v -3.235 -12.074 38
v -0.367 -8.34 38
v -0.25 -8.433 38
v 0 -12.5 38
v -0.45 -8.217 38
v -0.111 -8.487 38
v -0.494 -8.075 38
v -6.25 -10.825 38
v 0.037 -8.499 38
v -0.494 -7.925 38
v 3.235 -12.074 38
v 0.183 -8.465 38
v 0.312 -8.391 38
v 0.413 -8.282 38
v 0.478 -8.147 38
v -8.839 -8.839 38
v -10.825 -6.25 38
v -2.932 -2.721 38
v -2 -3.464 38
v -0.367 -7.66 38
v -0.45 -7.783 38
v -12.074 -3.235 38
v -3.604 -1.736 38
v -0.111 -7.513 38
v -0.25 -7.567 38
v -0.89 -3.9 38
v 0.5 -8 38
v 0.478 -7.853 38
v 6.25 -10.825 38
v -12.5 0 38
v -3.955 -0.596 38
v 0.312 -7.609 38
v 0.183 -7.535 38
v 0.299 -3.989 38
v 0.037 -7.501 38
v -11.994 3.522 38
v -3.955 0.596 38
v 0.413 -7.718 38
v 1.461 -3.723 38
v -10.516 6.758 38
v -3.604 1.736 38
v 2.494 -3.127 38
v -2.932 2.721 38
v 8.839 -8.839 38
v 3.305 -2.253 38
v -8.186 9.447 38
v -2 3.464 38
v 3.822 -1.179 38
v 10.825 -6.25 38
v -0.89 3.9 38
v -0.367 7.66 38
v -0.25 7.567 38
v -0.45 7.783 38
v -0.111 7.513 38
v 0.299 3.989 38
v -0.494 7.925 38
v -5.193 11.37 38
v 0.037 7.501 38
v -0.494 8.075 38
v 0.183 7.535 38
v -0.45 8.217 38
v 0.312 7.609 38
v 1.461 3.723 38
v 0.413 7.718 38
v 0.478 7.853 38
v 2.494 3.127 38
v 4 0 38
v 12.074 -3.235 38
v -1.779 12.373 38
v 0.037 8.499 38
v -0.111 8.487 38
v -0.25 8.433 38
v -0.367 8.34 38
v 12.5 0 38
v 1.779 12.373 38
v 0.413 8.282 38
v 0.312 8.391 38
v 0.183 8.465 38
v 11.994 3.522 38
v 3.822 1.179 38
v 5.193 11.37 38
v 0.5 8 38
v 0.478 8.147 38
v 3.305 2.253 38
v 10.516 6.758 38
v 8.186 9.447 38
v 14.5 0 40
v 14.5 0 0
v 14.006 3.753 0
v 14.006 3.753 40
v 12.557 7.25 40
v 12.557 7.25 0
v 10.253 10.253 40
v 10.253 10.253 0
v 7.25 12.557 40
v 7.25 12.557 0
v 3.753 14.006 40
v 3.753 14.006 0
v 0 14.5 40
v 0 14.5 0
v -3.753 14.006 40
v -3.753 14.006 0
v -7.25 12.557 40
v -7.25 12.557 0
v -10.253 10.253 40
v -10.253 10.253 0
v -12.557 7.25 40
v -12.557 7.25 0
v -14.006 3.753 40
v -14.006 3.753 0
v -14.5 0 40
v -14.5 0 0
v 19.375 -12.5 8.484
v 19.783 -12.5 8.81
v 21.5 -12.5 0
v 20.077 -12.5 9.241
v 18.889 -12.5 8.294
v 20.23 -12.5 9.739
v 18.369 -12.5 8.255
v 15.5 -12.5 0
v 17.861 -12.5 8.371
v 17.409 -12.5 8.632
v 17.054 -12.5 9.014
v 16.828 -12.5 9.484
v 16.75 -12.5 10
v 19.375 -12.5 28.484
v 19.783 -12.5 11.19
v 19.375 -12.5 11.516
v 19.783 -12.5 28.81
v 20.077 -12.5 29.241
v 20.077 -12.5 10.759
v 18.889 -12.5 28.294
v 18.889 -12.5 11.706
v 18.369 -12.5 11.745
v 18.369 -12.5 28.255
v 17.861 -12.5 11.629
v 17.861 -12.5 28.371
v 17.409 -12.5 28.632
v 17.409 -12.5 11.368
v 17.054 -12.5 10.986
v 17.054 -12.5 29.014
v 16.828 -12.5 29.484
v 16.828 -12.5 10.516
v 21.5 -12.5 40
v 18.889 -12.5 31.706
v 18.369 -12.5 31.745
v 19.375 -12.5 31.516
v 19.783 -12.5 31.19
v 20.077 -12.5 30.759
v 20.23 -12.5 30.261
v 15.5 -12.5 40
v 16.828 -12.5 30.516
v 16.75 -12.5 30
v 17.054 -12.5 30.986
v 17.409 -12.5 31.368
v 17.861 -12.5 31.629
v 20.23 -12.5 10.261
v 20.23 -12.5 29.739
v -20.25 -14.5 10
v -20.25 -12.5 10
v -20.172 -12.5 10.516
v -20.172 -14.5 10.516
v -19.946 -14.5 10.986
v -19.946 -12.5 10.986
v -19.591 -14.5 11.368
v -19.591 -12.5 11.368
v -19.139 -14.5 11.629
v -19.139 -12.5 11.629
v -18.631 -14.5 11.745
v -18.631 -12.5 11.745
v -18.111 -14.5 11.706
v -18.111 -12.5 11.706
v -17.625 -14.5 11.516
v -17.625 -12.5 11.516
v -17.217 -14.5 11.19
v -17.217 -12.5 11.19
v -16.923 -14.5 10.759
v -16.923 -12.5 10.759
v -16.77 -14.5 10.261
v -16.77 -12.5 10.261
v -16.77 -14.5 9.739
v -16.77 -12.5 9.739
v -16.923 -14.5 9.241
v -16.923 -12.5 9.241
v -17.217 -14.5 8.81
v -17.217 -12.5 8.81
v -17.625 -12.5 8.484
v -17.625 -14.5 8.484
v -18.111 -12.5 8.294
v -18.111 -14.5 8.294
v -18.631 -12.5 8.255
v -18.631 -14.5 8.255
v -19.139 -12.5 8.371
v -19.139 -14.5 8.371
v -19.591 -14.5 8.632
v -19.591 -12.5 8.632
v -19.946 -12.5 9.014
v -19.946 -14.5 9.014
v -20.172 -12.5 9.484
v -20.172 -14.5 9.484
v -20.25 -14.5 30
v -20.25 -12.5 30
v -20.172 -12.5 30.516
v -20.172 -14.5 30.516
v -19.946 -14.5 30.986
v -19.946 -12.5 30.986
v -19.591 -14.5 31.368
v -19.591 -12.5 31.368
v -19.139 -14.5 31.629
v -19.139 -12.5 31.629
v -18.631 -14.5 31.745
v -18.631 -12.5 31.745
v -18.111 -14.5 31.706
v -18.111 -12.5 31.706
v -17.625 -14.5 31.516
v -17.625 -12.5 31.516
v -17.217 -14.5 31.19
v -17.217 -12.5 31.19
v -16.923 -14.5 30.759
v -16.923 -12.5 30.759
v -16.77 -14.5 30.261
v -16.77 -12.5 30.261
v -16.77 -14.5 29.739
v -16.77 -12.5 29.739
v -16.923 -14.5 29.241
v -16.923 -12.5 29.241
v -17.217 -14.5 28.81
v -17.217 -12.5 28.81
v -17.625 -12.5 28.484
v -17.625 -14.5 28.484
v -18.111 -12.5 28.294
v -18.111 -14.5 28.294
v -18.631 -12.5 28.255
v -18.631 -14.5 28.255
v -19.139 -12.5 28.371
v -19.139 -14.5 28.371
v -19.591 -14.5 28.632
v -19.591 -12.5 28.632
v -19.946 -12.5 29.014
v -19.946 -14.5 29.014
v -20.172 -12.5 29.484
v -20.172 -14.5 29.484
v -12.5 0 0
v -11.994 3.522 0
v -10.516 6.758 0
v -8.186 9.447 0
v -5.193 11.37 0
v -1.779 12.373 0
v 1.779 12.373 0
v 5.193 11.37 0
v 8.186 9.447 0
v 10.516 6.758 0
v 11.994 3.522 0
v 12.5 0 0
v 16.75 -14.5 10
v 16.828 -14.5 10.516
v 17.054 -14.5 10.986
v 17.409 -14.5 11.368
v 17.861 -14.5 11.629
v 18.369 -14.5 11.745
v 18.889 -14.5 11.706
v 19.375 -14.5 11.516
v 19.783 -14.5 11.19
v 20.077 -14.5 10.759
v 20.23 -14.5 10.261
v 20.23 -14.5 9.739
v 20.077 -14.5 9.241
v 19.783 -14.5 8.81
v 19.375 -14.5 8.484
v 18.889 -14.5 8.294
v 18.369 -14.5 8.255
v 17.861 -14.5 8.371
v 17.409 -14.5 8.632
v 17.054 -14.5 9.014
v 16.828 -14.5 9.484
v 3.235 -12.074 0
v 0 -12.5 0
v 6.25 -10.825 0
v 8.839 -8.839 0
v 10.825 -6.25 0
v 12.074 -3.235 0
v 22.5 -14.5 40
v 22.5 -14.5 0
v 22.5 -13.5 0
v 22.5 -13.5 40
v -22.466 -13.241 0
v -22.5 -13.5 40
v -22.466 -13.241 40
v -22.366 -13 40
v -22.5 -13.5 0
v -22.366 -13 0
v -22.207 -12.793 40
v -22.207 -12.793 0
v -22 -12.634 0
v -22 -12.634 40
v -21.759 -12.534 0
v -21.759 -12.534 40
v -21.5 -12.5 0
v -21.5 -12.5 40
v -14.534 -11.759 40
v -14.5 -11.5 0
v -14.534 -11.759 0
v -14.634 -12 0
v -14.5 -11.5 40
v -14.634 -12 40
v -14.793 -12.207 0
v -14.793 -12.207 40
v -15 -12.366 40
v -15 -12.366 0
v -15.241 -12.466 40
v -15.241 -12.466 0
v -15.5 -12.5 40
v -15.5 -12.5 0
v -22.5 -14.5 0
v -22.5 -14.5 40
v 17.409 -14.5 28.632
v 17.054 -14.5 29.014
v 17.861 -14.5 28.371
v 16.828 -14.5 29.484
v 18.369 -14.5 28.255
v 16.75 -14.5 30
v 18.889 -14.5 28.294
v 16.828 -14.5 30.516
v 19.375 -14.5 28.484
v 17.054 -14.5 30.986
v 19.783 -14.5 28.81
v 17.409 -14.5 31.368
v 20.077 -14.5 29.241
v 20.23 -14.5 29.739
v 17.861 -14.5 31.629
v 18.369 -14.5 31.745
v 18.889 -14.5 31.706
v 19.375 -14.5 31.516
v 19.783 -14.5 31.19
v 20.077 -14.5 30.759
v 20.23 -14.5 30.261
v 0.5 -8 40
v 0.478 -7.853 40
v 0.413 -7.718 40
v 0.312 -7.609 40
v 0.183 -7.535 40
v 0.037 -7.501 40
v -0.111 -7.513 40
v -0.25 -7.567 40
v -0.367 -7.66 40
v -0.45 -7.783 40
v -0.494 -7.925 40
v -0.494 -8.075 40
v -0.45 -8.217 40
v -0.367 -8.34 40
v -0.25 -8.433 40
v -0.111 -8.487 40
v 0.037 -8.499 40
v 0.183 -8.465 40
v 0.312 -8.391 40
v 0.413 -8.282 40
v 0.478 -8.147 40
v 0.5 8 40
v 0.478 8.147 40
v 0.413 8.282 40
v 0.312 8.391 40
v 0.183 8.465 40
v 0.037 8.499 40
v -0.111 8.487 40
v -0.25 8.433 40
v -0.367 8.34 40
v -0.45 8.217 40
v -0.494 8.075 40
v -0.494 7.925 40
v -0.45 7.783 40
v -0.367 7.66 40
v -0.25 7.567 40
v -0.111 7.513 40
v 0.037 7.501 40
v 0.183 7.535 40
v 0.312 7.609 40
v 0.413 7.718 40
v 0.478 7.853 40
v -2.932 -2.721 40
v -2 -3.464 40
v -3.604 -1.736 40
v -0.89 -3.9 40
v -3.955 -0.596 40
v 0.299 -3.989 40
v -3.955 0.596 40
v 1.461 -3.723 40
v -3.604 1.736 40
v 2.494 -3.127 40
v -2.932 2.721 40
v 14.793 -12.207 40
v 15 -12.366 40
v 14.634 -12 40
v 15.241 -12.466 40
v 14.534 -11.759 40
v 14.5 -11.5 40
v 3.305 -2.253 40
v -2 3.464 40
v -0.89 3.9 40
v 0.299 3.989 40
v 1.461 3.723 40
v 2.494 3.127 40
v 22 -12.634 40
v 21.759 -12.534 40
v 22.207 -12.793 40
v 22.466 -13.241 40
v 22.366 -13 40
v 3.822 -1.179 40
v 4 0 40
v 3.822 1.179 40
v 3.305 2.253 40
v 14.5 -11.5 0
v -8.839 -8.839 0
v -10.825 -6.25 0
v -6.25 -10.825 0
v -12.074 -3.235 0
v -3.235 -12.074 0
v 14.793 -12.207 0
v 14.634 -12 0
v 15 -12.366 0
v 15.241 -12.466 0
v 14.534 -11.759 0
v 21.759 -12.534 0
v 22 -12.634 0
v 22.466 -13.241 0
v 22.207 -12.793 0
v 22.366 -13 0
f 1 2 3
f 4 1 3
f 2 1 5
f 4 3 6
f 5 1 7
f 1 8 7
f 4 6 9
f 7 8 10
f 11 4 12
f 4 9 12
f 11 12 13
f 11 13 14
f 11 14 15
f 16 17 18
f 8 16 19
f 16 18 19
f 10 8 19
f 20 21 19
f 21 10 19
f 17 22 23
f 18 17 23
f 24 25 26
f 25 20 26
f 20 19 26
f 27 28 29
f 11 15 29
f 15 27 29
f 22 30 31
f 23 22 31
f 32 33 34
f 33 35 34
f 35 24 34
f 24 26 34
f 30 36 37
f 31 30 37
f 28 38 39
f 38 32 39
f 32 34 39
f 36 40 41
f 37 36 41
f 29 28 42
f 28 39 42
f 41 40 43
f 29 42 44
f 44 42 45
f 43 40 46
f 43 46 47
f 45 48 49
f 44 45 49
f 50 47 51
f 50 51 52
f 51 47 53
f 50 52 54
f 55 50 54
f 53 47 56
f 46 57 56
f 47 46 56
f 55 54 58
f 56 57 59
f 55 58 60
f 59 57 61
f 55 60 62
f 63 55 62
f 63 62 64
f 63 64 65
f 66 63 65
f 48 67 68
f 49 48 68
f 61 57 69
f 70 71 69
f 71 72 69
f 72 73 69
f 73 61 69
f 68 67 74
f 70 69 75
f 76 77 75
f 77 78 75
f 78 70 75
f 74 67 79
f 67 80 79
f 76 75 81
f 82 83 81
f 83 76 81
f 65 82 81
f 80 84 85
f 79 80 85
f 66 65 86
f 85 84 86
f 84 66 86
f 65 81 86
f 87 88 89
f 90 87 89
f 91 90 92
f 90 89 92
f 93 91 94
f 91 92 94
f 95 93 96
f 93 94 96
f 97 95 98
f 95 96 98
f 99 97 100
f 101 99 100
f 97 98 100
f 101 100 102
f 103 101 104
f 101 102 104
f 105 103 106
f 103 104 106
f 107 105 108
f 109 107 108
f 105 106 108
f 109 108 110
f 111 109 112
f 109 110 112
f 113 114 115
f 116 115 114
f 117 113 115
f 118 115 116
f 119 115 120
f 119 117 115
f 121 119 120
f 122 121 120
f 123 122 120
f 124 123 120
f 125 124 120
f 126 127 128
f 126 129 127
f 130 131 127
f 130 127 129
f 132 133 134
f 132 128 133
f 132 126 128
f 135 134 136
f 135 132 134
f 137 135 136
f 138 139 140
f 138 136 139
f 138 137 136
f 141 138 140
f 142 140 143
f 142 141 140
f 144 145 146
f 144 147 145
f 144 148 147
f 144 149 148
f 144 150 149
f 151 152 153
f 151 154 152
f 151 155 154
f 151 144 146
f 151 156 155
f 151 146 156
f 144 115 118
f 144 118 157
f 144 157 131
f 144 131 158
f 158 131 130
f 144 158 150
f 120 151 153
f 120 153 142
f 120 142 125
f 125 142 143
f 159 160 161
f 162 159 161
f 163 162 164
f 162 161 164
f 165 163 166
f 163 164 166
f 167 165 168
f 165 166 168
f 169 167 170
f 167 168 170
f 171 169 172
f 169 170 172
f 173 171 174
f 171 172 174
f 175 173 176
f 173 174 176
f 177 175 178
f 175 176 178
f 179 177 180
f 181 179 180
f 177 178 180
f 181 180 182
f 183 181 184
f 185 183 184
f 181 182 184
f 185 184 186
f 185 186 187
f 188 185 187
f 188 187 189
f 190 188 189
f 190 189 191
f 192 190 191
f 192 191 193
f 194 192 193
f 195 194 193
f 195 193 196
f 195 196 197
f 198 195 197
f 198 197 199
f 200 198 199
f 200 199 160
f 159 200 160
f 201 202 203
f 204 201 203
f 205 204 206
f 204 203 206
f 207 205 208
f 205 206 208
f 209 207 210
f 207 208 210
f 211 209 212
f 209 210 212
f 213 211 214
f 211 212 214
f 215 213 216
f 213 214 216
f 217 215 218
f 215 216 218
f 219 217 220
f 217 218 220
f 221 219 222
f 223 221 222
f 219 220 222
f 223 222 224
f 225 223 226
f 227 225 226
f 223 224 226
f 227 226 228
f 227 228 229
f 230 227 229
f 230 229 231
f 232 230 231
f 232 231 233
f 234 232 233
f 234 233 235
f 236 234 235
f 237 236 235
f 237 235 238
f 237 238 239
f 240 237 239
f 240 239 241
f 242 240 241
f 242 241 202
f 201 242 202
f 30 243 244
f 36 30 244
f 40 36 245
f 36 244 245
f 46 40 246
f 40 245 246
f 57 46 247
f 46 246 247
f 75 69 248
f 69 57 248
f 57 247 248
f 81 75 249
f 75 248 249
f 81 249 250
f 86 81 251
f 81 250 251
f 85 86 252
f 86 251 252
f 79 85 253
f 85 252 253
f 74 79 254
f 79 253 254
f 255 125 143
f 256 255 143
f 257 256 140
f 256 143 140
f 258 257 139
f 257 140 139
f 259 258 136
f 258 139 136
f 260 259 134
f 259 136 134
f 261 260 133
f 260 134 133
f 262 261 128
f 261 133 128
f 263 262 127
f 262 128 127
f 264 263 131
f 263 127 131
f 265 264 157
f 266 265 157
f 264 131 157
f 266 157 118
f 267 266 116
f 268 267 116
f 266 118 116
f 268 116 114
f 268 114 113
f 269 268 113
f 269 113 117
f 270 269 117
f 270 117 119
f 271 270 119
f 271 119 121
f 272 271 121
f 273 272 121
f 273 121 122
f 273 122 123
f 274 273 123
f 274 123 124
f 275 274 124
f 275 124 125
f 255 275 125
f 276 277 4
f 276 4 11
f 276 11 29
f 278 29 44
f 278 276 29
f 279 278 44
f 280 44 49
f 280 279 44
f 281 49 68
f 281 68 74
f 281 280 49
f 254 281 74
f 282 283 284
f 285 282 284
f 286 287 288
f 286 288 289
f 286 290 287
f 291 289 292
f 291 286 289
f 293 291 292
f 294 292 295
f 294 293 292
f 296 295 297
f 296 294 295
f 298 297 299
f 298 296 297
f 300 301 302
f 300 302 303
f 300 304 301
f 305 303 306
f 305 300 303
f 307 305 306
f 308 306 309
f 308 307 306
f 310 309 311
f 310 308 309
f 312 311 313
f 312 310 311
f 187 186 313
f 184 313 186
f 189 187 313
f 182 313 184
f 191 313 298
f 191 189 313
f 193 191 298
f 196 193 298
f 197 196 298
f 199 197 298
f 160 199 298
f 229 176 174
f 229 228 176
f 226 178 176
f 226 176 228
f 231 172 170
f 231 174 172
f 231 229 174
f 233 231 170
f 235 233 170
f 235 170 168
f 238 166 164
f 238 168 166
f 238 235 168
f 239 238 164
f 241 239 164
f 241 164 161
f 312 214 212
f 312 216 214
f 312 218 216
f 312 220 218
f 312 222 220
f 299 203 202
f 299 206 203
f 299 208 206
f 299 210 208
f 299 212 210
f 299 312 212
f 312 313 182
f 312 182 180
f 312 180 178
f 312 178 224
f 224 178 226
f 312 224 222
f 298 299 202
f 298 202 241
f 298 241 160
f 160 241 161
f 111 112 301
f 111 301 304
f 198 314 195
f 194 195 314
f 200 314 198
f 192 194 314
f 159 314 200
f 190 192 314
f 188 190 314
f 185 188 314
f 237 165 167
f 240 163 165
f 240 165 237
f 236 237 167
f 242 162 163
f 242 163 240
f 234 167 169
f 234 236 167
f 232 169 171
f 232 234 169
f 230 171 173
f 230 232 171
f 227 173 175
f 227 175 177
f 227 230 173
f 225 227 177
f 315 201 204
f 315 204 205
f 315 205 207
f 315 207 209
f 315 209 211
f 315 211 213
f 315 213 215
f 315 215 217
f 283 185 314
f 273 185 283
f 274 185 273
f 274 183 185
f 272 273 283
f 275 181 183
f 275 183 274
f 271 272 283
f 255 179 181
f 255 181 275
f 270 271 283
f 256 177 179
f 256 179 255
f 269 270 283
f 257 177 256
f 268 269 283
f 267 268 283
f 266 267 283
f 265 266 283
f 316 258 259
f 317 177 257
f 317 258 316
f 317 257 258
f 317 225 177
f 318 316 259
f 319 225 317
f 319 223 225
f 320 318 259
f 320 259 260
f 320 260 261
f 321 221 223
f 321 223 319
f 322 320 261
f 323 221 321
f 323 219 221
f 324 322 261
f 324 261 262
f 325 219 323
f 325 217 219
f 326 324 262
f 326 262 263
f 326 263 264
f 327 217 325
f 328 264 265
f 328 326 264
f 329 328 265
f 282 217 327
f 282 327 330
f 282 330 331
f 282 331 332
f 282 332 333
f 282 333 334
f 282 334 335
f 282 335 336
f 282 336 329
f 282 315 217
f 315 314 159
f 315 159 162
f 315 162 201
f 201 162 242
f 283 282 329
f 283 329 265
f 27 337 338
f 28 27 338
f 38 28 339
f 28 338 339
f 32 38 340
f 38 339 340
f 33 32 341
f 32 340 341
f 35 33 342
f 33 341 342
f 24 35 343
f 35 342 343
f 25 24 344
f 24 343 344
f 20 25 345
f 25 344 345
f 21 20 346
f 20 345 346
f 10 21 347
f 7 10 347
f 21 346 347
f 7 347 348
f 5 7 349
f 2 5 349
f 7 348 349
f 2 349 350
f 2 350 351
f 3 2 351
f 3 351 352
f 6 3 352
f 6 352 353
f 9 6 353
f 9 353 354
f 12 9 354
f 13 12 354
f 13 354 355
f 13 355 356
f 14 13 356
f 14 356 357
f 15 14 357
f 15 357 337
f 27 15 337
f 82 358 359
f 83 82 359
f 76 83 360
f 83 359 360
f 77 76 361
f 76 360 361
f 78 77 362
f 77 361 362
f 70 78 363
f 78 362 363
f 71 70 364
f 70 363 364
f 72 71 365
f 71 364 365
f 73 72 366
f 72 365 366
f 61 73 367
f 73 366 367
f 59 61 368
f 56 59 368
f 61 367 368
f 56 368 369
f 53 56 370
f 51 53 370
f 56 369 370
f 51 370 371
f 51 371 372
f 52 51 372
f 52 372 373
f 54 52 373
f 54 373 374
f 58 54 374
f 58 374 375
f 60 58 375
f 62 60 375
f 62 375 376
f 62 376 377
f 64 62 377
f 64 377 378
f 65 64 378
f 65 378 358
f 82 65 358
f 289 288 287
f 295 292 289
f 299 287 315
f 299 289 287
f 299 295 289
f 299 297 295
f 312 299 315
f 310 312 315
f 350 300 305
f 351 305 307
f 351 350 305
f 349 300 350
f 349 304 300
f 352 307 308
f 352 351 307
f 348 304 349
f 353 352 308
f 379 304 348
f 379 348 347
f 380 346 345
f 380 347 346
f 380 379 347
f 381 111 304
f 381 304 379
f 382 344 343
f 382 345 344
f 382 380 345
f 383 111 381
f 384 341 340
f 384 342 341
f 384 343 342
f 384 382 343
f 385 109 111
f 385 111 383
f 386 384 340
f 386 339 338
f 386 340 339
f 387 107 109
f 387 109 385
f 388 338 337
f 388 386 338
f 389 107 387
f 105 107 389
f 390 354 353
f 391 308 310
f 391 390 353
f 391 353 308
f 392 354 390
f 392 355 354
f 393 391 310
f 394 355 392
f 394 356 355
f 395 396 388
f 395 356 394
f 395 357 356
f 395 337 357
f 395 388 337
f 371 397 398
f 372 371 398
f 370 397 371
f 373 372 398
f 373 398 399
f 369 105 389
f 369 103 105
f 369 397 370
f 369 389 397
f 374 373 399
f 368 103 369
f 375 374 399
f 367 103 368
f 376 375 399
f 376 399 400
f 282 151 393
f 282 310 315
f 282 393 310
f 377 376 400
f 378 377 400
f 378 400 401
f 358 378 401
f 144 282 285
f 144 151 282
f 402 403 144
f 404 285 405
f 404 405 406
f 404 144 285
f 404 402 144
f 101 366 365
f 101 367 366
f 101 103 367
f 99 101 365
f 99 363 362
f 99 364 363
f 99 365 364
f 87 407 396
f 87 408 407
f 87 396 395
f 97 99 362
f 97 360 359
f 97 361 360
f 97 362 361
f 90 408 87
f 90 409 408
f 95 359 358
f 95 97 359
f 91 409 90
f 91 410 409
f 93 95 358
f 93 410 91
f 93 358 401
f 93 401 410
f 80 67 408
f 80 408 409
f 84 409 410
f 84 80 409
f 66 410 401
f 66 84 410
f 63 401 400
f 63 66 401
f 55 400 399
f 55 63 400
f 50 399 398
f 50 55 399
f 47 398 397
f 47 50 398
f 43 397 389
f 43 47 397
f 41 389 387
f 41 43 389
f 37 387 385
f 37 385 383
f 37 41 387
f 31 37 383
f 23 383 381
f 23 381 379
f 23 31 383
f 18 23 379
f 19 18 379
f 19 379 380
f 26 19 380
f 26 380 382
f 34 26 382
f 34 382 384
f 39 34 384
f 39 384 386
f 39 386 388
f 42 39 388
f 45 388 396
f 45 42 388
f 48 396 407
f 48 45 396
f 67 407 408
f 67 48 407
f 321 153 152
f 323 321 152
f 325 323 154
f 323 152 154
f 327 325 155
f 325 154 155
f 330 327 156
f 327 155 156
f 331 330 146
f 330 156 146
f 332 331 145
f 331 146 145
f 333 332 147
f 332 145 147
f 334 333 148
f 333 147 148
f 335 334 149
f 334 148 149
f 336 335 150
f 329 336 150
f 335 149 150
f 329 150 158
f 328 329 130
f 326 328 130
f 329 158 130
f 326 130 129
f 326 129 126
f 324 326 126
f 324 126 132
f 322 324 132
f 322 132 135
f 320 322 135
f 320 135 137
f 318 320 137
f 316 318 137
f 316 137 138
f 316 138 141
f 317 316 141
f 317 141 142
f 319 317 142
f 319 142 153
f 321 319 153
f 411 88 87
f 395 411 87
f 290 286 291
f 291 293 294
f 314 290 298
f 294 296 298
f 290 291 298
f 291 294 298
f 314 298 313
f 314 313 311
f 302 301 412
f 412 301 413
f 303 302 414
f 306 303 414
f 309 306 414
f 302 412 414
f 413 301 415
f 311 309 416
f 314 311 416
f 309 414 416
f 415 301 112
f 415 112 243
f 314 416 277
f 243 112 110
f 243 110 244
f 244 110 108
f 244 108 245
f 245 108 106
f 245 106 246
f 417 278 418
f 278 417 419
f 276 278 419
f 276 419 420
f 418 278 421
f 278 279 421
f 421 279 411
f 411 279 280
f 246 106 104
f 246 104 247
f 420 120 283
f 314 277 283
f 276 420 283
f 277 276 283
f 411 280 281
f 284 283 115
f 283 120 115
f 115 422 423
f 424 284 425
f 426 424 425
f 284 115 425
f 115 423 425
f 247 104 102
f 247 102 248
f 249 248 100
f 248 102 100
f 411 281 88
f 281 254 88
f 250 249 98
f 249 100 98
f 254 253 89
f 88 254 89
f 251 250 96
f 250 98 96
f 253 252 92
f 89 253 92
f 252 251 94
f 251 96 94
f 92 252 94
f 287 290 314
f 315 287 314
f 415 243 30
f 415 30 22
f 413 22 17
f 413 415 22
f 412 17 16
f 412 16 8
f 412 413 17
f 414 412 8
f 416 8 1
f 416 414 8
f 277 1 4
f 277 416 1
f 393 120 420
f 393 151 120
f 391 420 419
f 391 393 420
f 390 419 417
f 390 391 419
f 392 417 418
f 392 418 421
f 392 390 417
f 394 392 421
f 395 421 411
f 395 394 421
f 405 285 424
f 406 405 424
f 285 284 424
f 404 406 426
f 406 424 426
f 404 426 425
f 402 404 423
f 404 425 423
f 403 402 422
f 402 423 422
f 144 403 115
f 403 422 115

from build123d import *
from build123d.topology import SkipClean

# Parameters (mm, degrees)
BOSS_EXTRU_1_DEPTH      = 40
ESQUISSE2_W             = 2
ESQUISSE2_H             = 40
BOSS_EXTRU_2_DEPTH      = 12.5
BOSS_EXTRU_4_START      = -2
ESQUISSE4_R             = 4
BOSS_EXTRU_4_DEPTH      = 2
ESQUISSE5_R             = 0.5
ENL_V_MAT_EXTRU_1_DEPTH = 45.949972191
BOSS_EXTRU_13_DEPTH     = 40
BOSS_EXTRU_14_START     = 38
BOSS_EXTRU_14_DEPTH     = 38
CONG_1_R                = 1
ESQUISSE10_R            = 1.75
ENL_V_MAT_EXTRU_2_DEPTH = 54.247065647


with BuildPart() as part:
    # Esquisse1 → Boss.-Extru.1 (new body)
    with BuildSketch(Plane.XY):
        with BuildLine():
            ThreePointArc((-12.5, 0), (0, 12.5), (12.5, 0))
            Line((12.5, 0), (14.5, 0))
            ThreePointArc((14.5, 0), (0, 14.5), (-14.5, 0))
            Line((-14.5, 0), (-12.5, 0))
        make_face()
    extrude(amount=BOSS_EXTRU_1_DEPTH)

    # Esquisse2 → Boss.-Extru.2 (add)
    with BuildSketch(Plane.XZ):
        with Locations((-13.5, 20)):
            Rectangle(ESQUISSE2_W, ESQUISSE2_H)
        with Locations((13.5, 20)):
            Rectangle(ESQUISSE2_W, ESQUISSE2_H)
    extrude(amount=BOSS_EXTRU_2_DEPTH)

    # Esquisse4 → Boss.-Extru.4 (add)
    with BuildSketch(Plane.XY.offset(40).offset(BOSS_EXTRU_4_START)):
        with BuildLine():
            Line((-12.5, 0), (-12.5, -12.5))
            Line((-12.5, -12.5), (12.5, -12.5))
            Line((12.5, -12.5), (12.5, 0))
            ThreePointArc((12.5, 0), (0, 12.5), (-12.5, 0))
        make_face()
        Circle(ESQUISSE4_R, mode=Mode.SUBTRACT)
    extrude(amount=BOSS_EXTRU_4_DEPTH)

    # Esquisse5 → Enlèv. mat.-Extru.1 (cut, through all)
    with BuildSketch(Plane.XY.offset(40)):
        with Locations((0, -8)):
            Circle(ESQUISSE5_R)
        with Locations((0, 8)):
            Circle(ESQUISSE5_R)
    extrude(amount=-ENL_V_MAT_EXTRU_1_DEPTH, mode=Mode.SUBTRACT)

    # Esquisse8 → Boss.-Extru.13 (add)
    with BuildSketch(Plane.XY.offset(40)):
        Polygon((-14.5, -12.5), (-22.5, -12.5), (-22.5, -14.5), (22.5, -14.5), (22.5, -12.5), (14.5, -12.5), align=None)
    extrude(amount=-BOSS_EXTRU_13_DEPTH)

    # Esquisse9 → Boss.-Extru.14 (add)
    with SkipClean():  # the faces are left unmerged after this step: merging them gives an invalid solid
        with BuildSketch(Plane(origin=(0, 0, 38), x_dir=(-1, 0, 0), z_dir=(0, 0, -1)).offset(BOSS_EXTRU_14_START)):
            with BuildLine():
                Line((-12.5, 0), (-12.5, -12.5))
                Line((-12.5, -12.5), (-3e-08, -12.5))
                ThreePointArc((-3e-08, -12.5), (-8.838834775, -8.838834754), (-12.5, 0))
            make_face()
            with BuildLine():
                ThreePointArc((12.5, 0), (8.838834754, -8.838834775), (-3e-08, -12.5))
                Line((-3e-08, -12.5), (12.5, -12.5))
                Line((12.5, -12.5), (12.5, 0))
            make_face()
        extrude(amount=-BOSS_EXTRU_14_DEPTH)

    # Congé1
    cong_1_edges = [part.edges().sort_by_distance(p)[0] for p in [
        (-14.5, -12.5, 20),
        (14.5, -12.5, 20),
        (-22.5, -12.5, 20),
        (22.5, -12.5, 20),
    ]]
    fillet(cong_1_edges, radius=CONG_1_R)

    # Esquisse10 → Enlèv. mat.-Extru.2 (cut, through all)
    with SkipClean():  # the faces are left unmerged after this step: merging them gives an invalid solid
        with BuildSketch(Plane(origin=(0, -12.5, 0), x_dir=(1, 0, 0), z_dir=(0, 1, 0))):
            with Locations(Location((-18.5, -10, 0), (0, 0, 180))):
                Circle(ESQUISSE10_R)
            with Locations(Location((-18.5, -30, 0), (0, 0, 180))):
                Circle(ESQUISSE10_R)
            with Locations(Location((18.5, -30, 0), (0, 0, 180))):
                Circle(ESQUISSE10_R)
            with Locations(Location((18.5, -10, 0), (0, 0, 180))):
                Circle(ESQUISSE10_R)
        extrude(amount=-ENL_V_MAT_EXTRU_2_DEPTH, mode=Mode.SUBTRACT)


solid = part.part
